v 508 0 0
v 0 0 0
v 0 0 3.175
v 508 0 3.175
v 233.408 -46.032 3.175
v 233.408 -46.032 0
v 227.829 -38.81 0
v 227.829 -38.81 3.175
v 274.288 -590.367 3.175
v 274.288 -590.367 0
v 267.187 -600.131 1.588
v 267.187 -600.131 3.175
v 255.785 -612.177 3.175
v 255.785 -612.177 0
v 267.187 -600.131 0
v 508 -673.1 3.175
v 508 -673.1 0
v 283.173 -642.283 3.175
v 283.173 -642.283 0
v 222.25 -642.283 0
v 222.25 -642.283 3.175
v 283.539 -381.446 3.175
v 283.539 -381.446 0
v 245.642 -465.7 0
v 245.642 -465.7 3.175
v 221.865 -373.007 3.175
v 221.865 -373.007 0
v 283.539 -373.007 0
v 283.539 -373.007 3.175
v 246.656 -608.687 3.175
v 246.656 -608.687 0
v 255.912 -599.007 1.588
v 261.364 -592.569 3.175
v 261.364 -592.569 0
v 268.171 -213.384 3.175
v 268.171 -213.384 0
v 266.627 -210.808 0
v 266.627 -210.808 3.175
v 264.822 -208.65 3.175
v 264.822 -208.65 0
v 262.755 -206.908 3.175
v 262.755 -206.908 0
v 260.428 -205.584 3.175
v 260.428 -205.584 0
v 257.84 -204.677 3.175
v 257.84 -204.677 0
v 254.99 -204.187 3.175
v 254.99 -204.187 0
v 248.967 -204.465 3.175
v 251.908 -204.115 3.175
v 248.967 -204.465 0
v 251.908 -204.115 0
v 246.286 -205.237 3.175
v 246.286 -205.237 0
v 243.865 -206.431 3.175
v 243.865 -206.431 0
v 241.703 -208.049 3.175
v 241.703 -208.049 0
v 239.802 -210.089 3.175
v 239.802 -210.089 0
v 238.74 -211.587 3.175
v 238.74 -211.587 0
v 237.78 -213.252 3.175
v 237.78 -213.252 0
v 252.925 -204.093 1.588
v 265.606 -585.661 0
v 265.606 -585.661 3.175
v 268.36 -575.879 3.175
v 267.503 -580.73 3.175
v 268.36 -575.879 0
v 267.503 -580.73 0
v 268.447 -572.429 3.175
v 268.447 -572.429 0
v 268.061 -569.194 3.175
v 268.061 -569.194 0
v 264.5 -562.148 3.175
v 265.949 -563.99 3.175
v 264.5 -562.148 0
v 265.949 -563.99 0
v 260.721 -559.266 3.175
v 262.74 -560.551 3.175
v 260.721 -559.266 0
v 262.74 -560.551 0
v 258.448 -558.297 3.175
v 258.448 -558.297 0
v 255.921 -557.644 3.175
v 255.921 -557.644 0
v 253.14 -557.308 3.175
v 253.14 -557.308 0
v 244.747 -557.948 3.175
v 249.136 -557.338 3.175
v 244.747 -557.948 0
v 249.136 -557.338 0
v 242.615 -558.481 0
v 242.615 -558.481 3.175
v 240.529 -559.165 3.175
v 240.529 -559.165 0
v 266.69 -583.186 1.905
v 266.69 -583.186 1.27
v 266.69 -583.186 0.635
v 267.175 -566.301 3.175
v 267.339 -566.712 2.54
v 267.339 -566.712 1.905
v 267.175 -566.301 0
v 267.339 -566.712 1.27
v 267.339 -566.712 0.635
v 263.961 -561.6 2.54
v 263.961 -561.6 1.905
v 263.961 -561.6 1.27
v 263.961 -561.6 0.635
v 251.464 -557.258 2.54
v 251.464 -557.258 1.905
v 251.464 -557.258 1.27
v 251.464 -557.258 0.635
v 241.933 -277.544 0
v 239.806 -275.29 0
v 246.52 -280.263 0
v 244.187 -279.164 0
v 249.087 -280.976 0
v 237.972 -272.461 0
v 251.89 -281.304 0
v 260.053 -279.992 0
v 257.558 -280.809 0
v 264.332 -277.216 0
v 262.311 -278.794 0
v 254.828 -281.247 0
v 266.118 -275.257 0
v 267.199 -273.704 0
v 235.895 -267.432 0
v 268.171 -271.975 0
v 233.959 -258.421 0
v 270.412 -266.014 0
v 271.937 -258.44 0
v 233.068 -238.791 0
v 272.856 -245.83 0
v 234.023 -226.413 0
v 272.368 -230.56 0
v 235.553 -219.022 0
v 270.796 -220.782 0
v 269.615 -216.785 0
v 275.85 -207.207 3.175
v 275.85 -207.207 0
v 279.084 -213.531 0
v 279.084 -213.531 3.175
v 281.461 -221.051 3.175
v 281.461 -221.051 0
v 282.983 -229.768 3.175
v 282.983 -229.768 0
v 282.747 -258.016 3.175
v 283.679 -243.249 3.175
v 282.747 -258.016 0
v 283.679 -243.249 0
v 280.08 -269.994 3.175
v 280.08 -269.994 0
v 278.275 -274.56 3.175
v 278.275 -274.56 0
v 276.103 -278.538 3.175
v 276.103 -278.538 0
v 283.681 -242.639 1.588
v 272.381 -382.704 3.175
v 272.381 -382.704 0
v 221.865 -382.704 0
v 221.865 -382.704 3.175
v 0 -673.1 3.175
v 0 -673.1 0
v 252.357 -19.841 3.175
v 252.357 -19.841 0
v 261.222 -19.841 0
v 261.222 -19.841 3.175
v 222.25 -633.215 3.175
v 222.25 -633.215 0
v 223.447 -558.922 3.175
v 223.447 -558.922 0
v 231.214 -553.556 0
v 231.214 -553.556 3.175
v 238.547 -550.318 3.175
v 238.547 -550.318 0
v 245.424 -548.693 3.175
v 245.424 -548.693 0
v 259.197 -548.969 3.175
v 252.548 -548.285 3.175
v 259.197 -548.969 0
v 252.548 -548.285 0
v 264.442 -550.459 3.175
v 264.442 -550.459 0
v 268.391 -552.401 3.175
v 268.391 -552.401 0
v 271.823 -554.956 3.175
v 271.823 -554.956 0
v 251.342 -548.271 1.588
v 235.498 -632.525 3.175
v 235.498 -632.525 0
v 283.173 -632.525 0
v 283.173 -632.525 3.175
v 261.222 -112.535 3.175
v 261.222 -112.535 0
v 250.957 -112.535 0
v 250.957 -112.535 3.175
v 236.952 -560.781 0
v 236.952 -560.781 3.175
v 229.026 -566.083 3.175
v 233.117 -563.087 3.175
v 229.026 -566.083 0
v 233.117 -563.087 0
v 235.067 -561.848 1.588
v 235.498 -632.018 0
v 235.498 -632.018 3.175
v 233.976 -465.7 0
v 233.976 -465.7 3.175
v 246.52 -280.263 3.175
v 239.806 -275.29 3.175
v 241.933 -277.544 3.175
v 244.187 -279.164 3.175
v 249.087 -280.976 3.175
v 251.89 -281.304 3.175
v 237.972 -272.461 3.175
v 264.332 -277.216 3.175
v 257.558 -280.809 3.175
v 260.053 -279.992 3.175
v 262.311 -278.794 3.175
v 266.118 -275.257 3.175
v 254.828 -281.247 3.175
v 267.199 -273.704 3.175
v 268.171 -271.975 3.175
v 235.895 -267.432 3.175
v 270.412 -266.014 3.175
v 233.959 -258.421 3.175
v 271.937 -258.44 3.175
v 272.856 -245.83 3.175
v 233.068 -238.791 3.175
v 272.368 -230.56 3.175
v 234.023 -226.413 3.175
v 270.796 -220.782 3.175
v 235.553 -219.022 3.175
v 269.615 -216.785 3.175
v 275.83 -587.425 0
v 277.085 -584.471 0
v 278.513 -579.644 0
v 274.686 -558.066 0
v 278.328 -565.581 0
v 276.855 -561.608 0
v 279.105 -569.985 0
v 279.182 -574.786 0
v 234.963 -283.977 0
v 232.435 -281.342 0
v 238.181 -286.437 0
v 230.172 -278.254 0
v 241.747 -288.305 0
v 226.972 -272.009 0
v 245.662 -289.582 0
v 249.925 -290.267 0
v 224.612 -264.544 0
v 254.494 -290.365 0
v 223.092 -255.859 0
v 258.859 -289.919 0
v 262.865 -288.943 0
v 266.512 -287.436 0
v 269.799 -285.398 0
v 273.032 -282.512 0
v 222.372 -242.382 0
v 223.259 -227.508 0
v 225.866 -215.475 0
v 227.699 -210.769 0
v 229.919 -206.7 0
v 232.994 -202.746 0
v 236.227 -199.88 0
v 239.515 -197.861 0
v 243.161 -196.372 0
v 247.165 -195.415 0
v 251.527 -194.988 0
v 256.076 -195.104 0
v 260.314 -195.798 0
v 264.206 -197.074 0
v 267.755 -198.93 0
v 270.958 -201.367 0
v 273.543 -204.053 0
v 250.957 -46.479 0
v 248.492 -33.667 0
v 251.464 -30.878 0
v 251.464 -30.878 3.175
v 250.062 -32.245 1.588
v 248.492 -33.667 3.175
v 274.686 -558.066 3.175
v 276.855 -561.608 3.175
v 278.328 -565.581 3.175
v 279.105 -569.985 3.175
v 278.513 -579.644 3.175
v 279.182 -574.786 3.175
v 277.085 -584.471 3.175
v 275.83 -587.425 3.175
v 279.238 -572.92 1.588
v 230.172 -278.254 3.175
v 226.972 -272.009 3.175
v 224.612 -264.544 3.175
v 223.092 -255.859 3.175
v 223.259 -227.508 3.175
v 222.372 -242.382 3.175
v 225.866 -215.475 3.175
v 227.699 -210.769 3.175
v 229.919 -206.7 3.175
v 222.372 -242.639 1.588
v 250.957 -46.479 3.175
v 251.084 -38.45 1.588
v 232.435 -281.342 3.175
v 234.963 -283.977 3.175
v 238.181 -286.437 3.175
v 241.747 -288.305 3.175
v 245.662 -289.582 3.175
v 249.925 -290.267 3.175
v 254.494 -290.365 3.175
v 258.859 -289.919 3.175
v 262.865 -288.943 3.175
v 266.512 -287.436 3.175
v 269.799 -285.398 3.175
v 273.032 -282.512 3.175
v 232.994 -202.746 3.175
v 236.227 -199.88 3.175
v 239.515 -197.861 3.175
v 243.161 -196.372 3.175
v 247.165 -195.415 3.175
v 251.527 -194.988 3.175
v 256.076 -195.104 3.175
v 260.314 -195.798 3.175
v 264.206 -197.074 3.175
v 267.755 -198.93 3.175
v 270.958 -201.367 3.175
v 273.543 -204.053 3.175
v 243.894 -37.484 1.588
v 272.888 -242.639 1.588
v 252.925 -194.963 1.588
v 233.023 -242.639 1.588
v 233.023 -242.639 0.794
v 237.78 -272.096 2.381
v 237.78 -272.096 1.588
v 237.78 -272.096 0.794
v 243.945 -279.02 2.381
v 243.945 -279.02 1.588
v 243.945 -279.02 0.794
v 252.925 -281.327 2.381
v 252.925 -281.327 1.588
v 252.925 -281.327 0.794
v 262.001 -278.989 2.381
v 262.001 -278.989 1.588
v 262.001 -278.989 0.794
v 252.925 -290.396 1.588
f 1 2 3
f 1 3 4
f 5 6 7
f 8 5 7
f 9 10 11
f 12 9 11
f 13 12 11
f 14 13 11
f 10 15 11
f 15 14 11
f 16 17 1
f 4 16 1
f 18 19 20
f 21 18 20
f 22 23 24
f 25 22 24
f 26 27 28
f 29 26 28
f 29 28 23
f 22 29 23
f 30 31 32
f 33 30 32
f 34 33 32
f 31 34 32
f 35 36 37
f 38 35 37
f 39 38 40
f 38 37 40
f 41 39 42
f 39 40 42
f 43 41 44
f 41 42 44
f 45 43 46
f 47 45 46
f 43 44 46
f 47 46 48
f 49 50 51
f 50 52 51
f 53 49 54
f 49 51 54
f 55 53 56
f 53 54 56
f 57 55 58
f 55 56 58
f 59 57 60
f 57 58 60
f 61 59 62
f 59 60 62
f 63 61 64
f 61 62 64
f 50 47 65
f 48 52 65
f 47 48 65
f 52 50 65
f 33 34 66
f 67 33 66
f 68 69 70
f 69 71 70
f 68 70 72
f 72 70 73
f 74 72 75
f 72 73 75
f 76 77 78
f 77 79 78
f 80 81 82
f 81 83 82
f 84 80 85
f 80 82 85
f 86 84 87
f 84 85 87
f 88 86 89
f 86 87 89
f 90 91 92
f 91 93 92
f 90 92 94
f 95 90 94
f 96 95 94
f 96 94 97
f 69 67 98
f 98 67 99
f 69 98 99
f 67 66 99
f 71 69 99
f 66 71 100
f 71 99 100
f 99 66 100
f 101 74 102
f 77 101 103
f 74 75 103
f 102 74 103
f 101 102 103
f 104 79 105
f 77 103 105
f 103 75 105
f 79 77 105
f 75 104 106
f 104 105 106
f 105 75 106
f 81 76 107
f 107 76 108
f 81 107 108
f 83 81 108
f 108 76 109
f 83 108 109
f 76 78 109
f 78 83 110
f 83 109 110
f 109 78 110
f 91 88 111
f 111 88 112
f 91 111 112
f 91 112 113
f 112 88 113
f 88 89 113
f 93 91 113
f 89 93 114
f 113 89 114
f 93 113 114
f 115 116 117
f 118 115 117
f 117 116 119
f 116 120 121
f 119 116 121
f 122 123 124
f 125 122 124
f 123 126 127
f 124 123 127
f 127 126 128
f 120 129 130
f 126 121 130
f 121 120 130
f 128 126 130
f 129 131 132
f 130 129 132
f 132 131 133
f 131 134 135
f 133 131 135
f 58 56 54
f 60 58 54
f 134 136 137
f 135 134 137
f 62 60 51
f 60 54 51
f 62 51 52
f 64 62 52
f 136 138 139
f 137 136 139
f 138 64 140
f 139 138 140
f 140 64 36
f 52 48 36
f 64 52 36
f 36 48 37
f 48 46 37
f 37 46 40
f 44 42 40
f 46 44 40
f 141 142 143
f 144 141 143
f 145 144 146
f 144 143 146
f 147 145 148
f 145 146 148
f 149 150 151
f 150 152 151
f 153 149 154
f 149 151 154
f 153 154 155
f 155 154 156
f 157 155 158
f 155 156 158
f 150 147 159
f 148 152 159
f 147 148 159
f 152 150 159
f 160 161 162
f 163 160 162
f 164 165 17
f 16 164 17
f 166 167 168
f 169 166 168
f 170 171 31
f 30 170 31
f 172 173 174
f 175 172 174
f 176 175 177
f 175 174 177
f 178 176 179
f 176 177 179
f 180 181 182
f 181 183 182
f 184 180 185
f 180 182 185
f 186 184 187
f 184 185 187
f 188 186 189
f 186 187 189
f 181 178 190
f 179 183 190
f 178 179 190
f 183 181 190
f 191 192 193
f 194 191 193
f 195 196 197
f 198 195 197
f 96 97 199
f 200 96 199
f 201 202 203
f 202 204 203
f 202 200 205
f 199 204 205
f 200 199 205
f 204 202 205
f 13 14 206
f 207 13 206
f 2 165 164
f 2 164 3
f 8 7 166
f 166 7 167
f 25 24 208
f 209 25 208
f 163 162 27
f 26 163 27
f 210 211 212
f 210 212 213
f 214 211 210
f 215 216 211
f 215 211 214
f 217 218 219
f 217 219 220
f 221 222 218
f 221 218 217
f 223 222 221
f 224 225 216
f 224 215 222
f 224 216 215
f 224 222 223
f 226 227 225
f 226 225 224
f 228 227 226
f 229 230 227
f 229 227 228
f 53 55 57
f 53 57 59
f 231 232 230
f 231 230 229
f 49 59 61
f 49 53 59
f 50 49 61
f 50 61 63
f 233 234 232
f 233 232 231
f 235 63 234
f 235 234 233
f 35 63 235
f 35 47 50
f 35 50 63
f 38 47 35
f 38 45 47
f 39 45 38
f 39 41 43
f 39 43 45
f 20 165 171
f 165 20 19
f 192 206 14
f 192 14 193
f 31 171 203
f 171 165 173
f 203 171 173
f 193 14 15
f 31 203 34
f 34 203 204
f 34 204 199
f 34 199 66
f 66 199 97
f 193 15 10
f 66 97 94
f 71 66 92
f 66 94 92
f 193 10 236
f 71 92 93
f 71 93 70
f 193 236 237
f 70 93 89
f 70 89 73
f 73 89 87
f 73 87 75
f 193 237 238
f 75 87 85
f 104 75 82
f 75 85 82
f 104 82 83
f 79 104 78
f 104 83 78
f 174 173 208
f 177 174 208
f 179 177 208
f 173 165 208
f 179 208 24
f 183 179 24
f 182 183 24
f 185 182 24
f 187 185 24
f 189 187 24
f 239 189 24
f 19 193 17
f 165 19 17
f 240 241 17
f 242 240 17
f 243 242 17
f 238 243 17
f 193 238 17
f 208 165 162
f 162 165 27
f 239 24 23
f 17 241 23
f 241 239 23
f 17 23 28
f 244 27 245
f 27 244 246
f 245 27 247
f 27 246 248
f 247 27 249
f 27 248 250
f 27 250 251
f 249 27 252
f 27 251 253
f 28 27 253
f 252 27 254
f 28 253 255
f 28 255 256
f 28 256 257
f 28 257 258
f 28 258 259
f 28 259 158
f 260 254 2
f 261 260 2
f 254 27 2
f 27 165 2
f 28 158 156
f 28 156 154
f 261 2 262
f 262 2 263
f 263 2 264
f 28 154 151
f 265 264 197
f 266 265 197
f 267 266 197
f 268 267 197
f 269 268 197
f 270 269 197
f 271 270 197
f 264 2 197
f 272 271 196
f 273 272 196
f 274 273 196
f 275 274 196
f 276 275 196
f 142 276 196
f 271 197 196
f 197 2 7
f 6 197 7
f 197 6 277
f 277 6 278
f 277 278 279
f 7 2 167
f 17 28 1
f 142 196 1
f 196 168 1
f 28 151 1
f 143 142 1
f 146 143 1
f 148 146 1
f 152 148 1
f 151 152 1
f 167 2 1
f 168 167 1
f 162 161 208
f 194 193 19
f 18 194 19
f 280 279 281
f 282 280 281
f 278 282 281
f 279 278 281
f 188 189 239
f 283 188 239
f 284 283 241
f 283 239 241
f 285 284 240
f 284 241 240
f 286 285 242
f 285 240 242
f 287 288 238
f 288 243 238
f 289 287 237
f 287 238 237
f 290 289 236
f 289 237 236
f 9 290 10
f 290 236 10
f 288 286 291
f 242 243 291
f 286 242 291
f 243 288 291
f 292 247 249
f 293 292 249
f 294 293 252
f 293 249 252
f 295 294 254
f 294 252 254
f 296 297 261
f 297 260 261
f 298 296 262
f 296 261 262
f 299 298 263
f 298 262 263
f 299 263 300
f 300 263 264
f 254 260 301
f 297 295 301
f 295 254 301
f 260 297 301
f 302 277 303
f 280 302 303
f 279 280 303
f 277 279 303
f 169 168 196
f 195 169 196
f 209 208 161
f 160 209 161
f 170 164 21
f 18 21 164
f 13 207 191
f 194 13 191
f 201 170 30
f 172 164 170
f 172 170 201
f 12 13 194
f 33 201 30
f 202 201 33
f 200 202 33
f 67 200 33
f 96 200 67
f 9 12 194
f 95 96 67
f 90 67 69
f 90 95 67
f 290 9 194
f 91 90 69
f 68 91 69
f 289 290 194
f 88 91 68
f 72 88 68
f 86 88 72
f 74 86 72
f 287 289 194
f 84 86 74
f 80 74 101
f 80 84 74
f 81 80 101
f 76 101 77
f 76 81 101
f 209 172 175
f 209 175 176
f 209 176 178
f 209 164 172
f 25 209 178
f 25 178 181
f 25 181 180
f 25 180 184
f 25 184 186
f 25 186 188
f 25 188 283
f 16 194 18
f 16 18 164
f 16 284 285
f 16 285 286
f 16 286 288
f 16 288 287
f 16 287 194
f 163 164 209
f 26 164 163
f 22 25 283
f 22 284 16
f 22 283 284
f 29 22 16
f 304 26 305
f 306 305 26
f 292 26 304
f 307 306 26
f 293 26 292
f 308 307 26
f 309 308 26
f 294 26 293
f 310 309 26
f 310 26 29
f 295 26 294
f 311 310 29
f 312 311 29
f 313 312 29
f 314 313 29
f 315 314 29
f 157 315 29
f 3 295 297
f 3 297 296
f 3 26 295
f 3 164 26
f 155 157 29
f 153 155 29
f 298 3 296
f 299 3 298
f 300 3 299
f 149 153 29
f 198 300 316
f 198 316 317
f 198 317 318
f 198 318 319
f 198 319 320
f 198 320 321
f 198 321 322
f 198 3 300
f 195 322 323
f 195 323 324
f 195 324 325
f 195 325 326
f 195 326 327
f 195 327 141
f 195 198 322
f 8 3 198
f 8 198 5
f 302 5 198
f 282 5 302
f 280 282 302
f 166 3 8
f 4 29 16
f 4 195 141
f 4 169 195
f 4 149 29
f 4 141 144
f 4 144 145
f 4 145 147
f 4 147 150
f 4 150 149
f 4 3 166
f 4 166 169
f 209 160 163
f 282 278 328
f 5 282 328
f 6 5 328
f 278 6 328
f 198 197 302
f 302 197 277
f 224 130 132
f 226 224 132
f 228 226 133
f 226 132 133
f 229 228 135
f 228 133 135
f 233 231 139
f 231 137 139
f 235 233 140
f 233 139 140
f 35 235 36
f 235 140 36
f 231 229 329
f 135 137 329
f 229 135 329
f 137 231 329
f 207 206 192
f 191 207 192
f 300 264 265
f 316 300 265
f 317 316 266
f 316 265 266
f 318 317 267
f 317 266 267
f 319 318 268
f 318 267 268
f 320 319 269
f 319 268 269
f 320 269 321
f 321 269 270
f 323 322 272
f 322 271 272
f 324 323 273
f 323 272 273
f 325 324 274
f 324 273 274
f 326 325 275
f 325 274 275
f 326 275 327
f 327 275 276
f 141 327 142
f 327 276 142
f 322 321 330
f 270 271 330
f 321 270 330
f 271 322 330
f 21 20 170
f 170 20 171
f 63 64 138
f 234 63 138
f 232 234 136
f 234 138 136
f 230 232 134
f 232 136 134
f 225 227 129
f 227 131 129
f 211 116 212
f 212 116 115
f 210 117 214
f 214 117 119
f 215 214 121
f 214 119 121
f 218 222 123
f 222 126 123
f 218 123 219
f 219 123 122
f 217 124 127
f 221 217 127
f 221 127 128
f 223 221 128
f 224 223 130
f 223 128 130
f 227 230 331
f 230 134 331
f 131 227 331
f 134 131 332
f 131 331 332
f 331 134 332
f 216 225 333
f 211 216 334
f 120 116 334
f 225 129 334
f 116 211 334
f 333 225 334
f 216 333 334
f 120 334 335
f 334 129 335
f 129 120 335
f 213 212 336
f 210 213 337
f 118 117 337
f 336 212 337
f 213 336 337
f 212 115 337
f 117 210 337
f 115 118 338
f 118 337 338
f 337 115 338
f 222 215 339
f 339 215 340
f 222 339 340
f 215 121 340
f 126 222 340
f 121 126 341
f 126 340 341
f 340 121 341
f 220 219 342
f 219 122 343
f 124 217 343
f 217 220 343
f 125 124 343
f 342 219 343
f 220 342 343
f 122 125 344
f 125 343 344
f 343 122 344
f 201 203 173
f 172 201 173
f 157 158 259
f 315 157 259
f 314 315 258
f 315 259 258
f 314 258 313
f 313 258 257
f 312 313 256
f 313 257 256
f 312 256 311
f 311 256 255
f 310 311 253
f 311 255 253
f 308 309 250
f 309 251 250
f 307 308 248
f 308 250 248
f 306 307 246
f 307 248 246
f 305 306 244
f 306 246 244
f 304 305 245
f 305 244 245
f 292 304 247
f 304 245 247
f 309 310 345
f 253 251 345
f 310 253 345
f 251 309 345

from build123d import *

# Parameters (mm, degrees)
F0_W     = 508
F0_H     = 673.1
F1_DEPTH = 3.175


# Not quite as in the source:
# - a feature names something its author has since deleted; it is built from what else it names


with BuildPart() as f1:
    # F0 (on Top) → F1 (new body)
    with BuildSketch(Plane.XY):
        with Locations((254, -336.55)):
            Rectangle(F0_W, F0_H)
        with BuildLine():
            Line((283.1734824281, -632.5249201278), (283.1734824281, -642.2832268371))
            Line((283.1734824281, -642.2832268371), (222.25, -642.2832268371))
            Line((222.25, -642.2832268371), (222.25, -633.2146964856))
            Line((222.25, -633.2146964856), (246.6559105431, -608.6870607029))
            add(Edge.make_bspline(
                [(246.6559105431, -608.6870607029), (257.814057508, -597.3869009585), (261.3643769968, -592.5686102236)],
                knots=[0, 0, 0, 1, 1, 1], degree=2))
            add(Edge.make_bspline(
                [(261.3643769968, -592.5686102236), (264.9146964856, -587.7503194888), (266.68985623, -583.1856230032)],
                knots=[0, 0, 0, 1, 1, 1], degree=2))
            add(Edge.make_bspline(
                [(266.68985623, -583.1856230032), (268.4650159744, -578.6209265176), (268.4650159744, -573.3664536741)],
                knots=[0, 0, 0, 1, 1, 1], degree=2))
            add(Edge.make_bspline(
                [(268.4650159744, -573.3664536741), (268.4650159744, -565.9412140575), (263.9611821086, -561.5996805112)],
                knots=[0, 0, 0, 1, 1, 1], degree=2))
            add(Edge.make_bspline(
                [(263.9611821086, -561.5996805112), (259.4573482428, -557.2581469649), (251.464057508, -557.2581469649)],
                knots=[0, 0, 0, 1, 1, 1], degree=2))
            add(Edge.make_bspline(
                [(251.464057508, -557.2581469649), (245.7023961661, -557.2581469649), (240.5290734824, -559.1651757189)],
                knots=[0, 0, 0, 1, 1, 1], degree=2))
            add(Edge.make_bspline(
                [(240.5290734824, -559.1651757189), (235.3557507987, -561.0722044728), (229.0260383387, -566.0832268371)],
                knots=[0, 0, 0, 1, 1, 1], degree=2))
            Line((229.0260383387, -566.0832268371), (223.4469648562, -558.9217252396))
            add(Edge.make_bspline(
                [(223.4469648562, -558.9217252396), (236.2484025559, -548.2707667732), (251.3423322684, -548.2707667732)],
                knots=[0, 0, 0, 1, 1, 1], degree=2))
            add(Edge.make_bspline(
                [(251.3423322684, -548.2707667732), (264.4075079872, -548.2707667732), (271.8226038339, -554.9555111821)],
                knots=[0, 0, 0, 1, 1, 1], degree=2))
            add(Edge.make_bspline(
                [(271.8226038339, -554.9555111821), (279.2376996805, -561.6402555911), (279.2376996805, -572.9201277955)],
                knots=[0, 0, 0, 1, 1, 1], degree=2))
            add(Edge.make_bspline(
                [(279.2376996805, -572.9201277955), (279.2376996805, -581.7452076677), (274.2875399361, -590.3674121406)],
                knots=[0, 0, 0, 1, 1, 1], degree=2))
            add(Edge.make_bspline(
                [(274.2875399361, -590.3674121406), (269.3373801917, -598.9896166134), (255.7853035144, -612.1765175719)],
                knots=[0, 0, 0, 1, 1, 1], degree=2))
            Line((255.7853035144, -612.1765175719), (235.4977635783, -632.0177316294))
            Line((235.4977635783, -632.0177316294), (235.4977635783, -632.5249201278))
            Line((235.4977635783, -632.5249201278), (283.1734824281, -632.5249201278))
        make_face(mode=Mode.SUBTRACT)
        Polygon((245.6415335463, -465.7004792332), (233.9761980831, -465.7004792332), (272.3805111821, -382.7041533546), (221.8645367412, -382.7041533546), (221.8645367412, -373.0067092652), (283.538658147, -373.0067092652), (283.538658147, -381.4463258786), align=None, mode=Mode.SUBTRACT)
        with BuildLine():
            add(Edge.make_bspline(
                [(275.8496805112, -207.2067891374), (283.6806709265, -219.4503194888), (283.6806709265, -242.6389776358)],
                knots=[0, 0, 0, 1, 1, 1], degree=2))
            add(Edge.make_bspline(
                [(283.6806709265, -242.6389776358), (283.6806709265, -266.6797124601), (276.1032747604, -278.5377795527)],
                knots=[0, 0, 0, 1, 1, 1], degree=2))
            add(Edge.make_bspline(
                [(276.1032747604, -278.5377795527), (268.5258785942, -290.3958466454), (252.9247603834, -290.3958466454)],
                knots=[0, 0, 0, 1, 1, 1], degree=2))
            add(Edge.make_bspline(
                [(252.9247603834, -290.3958466454), (237.9728434505, -290.3958466454), (230.172284345, -278.2537539936)],
                knots=[0, 0, 0, 1, 1, 1], degree=2))
            add(Edge.make_bspline(
                [(230.172284345, -278.2537539936), (222.3717252396, -266.1116613419), (222.3717252396, -242.6389776358)],
                knots=[0, 0, 0, 1, 1, 1], degree=2))
            add(Edge.make_bspline(
                [(222.3717252396, -242.6389776358), (222.3717252396, -218.435942492), (229.9186900958, -206.699600639)],
                knots=[0, 0, 0, 1, 1, 1], degree=2))
            add(Edge.make_bspline(
                [(229.9186900958, -206.699600639), (237.4656549521, -194.9632587859), (252.9247603834, -194.9632587859)],
                knots=[0, 0, 0, 1, 1, 1], degree=2))
            add(Edge.make_bspline(
                [(252.9247603834, -194.9632587859), (268.0186900958, -194.9632587859), (275.8496805112, -207.2067891374)],
                knots=[0, 0, 0, 1, 1, 1], degree=2))
        make_face(mode=Mode.SUBTRACT)
        with BuildLine():
            Line((261.2223642173, -19.8412140575), (261.2223642173, -112.5349840256))
            Line((261.2223642173, -112.5349840256), (250.9568690096, -112.5349840256))
            Line((250.9568690096, -112.5349840256), (250.9568690096, -46.4787539936))
            add(Edge.make_bspline(
                [(250.9568690096, -46.4787539936), (250.9568690096, -38.2217252396), (251.464057508, -30.8776357827)],
                knots=[0, 0, 0, 1, 1, 1], degree=2))
            add(Edge.make_bspline(
                [(251.464057508, -30.8776357827), (250.1453674121, -32.2166134185), (248.4919329073, -33.667172524)],
                knots=[0, 0, 0, 1, 1, 1], degree=2))
            add(Edge.make_bspline(
                [(248.4919329073, -33.667172524), (246.8384984026, -35.1177316294), (233.4081469649, -46.032428115)],
                knots=[0, 0, 0, 1, 1, 1], degree=2))
            Line((233.4081469649, -46.032428115), (227.8290734824, -38.8100638978))
            Line((227.8290734824, -38.8100638978), (252.3567092652, -19.8412140575))
            Line((252.3567092652, -19.8412140575), (261.2223642173, -19.8412140575))
        make_face(mode=Mode.SUBTRACT)
    extrude(amount=F1_DEPTH)


with BuildPart() as f1b:
    # F0 (on Top) → F1, piece 2 (new body)
    with BuildSketch(Plane.XY):
        with BuildLine():
            add(Edge.make_bspline(
                [(237.7801118211, -213.2524760383), (233.0226837061, -222.4123003195), (233.0226837061, -242.6389776358)],
                knots=[0, 0, 0, 1, 1, 1], degree=2))
            add(Edge.make_bspline(
                [(233.0226837061, -242.6389776358), (233.0226837061, -262.8656549521), (237.7801118211, -272.096485623)],
                knots=[0, 0, 0, 1, 1, 1], degree=2))
            add(Edge.make_bspline(
                [(237.7801118211, -272.096485623), (242.5375399361, -281.3273162939), (252.9247603834, -281.3273162939)],
                knots=[0, 0, 0, 1, 1, 1], degree=2))
            add(Edge.make_bspline(
                [(252.9247603834, -281.3273162939), (263.4539936102, -281.3273162939), (268.1708466454, -271.9747603834)],
                knots=[0, 0, 0, 1, 1, 1], degree=2))
            add(Edge.make_bspline(
                [(268.1708466454, -271.9747603834), (272.8876996805, -262.6222044728), (272.8876996805, -242.6389776358)],
                knots=[0, 0, 0, 1, 1, 1], degree=2))
            add(Edge.make_bspline(
                [(272.8876996805, -242.6389776358), (272.8876996805, -222.6760383387), (268.1708466454, -213.3843450479)],
                knots=[0, 0, 0, 1, 1, 1], degree=2))
            add(Edge.make_bspline(
                [(268.1708466454, -213.3843450479), (263.4539936102, -204.0926517572), (252.9247603834, -204.0926517572)],
                knots=[0, 0, 0, 1, 1, 1], degree=2))
            add(Edge.make_bspline(
                [(252.9247603834, -204.0926517572), (242.5375399361, -204.0926517572), (237.7801118211, -213.2524760383)],
                knots=[0, 0, 0, 1, 1, 1], degree=2))
        make_face()
    extrude(amount=F1_DEPTH)


solid = Compound([f1.part, f1b.part])
